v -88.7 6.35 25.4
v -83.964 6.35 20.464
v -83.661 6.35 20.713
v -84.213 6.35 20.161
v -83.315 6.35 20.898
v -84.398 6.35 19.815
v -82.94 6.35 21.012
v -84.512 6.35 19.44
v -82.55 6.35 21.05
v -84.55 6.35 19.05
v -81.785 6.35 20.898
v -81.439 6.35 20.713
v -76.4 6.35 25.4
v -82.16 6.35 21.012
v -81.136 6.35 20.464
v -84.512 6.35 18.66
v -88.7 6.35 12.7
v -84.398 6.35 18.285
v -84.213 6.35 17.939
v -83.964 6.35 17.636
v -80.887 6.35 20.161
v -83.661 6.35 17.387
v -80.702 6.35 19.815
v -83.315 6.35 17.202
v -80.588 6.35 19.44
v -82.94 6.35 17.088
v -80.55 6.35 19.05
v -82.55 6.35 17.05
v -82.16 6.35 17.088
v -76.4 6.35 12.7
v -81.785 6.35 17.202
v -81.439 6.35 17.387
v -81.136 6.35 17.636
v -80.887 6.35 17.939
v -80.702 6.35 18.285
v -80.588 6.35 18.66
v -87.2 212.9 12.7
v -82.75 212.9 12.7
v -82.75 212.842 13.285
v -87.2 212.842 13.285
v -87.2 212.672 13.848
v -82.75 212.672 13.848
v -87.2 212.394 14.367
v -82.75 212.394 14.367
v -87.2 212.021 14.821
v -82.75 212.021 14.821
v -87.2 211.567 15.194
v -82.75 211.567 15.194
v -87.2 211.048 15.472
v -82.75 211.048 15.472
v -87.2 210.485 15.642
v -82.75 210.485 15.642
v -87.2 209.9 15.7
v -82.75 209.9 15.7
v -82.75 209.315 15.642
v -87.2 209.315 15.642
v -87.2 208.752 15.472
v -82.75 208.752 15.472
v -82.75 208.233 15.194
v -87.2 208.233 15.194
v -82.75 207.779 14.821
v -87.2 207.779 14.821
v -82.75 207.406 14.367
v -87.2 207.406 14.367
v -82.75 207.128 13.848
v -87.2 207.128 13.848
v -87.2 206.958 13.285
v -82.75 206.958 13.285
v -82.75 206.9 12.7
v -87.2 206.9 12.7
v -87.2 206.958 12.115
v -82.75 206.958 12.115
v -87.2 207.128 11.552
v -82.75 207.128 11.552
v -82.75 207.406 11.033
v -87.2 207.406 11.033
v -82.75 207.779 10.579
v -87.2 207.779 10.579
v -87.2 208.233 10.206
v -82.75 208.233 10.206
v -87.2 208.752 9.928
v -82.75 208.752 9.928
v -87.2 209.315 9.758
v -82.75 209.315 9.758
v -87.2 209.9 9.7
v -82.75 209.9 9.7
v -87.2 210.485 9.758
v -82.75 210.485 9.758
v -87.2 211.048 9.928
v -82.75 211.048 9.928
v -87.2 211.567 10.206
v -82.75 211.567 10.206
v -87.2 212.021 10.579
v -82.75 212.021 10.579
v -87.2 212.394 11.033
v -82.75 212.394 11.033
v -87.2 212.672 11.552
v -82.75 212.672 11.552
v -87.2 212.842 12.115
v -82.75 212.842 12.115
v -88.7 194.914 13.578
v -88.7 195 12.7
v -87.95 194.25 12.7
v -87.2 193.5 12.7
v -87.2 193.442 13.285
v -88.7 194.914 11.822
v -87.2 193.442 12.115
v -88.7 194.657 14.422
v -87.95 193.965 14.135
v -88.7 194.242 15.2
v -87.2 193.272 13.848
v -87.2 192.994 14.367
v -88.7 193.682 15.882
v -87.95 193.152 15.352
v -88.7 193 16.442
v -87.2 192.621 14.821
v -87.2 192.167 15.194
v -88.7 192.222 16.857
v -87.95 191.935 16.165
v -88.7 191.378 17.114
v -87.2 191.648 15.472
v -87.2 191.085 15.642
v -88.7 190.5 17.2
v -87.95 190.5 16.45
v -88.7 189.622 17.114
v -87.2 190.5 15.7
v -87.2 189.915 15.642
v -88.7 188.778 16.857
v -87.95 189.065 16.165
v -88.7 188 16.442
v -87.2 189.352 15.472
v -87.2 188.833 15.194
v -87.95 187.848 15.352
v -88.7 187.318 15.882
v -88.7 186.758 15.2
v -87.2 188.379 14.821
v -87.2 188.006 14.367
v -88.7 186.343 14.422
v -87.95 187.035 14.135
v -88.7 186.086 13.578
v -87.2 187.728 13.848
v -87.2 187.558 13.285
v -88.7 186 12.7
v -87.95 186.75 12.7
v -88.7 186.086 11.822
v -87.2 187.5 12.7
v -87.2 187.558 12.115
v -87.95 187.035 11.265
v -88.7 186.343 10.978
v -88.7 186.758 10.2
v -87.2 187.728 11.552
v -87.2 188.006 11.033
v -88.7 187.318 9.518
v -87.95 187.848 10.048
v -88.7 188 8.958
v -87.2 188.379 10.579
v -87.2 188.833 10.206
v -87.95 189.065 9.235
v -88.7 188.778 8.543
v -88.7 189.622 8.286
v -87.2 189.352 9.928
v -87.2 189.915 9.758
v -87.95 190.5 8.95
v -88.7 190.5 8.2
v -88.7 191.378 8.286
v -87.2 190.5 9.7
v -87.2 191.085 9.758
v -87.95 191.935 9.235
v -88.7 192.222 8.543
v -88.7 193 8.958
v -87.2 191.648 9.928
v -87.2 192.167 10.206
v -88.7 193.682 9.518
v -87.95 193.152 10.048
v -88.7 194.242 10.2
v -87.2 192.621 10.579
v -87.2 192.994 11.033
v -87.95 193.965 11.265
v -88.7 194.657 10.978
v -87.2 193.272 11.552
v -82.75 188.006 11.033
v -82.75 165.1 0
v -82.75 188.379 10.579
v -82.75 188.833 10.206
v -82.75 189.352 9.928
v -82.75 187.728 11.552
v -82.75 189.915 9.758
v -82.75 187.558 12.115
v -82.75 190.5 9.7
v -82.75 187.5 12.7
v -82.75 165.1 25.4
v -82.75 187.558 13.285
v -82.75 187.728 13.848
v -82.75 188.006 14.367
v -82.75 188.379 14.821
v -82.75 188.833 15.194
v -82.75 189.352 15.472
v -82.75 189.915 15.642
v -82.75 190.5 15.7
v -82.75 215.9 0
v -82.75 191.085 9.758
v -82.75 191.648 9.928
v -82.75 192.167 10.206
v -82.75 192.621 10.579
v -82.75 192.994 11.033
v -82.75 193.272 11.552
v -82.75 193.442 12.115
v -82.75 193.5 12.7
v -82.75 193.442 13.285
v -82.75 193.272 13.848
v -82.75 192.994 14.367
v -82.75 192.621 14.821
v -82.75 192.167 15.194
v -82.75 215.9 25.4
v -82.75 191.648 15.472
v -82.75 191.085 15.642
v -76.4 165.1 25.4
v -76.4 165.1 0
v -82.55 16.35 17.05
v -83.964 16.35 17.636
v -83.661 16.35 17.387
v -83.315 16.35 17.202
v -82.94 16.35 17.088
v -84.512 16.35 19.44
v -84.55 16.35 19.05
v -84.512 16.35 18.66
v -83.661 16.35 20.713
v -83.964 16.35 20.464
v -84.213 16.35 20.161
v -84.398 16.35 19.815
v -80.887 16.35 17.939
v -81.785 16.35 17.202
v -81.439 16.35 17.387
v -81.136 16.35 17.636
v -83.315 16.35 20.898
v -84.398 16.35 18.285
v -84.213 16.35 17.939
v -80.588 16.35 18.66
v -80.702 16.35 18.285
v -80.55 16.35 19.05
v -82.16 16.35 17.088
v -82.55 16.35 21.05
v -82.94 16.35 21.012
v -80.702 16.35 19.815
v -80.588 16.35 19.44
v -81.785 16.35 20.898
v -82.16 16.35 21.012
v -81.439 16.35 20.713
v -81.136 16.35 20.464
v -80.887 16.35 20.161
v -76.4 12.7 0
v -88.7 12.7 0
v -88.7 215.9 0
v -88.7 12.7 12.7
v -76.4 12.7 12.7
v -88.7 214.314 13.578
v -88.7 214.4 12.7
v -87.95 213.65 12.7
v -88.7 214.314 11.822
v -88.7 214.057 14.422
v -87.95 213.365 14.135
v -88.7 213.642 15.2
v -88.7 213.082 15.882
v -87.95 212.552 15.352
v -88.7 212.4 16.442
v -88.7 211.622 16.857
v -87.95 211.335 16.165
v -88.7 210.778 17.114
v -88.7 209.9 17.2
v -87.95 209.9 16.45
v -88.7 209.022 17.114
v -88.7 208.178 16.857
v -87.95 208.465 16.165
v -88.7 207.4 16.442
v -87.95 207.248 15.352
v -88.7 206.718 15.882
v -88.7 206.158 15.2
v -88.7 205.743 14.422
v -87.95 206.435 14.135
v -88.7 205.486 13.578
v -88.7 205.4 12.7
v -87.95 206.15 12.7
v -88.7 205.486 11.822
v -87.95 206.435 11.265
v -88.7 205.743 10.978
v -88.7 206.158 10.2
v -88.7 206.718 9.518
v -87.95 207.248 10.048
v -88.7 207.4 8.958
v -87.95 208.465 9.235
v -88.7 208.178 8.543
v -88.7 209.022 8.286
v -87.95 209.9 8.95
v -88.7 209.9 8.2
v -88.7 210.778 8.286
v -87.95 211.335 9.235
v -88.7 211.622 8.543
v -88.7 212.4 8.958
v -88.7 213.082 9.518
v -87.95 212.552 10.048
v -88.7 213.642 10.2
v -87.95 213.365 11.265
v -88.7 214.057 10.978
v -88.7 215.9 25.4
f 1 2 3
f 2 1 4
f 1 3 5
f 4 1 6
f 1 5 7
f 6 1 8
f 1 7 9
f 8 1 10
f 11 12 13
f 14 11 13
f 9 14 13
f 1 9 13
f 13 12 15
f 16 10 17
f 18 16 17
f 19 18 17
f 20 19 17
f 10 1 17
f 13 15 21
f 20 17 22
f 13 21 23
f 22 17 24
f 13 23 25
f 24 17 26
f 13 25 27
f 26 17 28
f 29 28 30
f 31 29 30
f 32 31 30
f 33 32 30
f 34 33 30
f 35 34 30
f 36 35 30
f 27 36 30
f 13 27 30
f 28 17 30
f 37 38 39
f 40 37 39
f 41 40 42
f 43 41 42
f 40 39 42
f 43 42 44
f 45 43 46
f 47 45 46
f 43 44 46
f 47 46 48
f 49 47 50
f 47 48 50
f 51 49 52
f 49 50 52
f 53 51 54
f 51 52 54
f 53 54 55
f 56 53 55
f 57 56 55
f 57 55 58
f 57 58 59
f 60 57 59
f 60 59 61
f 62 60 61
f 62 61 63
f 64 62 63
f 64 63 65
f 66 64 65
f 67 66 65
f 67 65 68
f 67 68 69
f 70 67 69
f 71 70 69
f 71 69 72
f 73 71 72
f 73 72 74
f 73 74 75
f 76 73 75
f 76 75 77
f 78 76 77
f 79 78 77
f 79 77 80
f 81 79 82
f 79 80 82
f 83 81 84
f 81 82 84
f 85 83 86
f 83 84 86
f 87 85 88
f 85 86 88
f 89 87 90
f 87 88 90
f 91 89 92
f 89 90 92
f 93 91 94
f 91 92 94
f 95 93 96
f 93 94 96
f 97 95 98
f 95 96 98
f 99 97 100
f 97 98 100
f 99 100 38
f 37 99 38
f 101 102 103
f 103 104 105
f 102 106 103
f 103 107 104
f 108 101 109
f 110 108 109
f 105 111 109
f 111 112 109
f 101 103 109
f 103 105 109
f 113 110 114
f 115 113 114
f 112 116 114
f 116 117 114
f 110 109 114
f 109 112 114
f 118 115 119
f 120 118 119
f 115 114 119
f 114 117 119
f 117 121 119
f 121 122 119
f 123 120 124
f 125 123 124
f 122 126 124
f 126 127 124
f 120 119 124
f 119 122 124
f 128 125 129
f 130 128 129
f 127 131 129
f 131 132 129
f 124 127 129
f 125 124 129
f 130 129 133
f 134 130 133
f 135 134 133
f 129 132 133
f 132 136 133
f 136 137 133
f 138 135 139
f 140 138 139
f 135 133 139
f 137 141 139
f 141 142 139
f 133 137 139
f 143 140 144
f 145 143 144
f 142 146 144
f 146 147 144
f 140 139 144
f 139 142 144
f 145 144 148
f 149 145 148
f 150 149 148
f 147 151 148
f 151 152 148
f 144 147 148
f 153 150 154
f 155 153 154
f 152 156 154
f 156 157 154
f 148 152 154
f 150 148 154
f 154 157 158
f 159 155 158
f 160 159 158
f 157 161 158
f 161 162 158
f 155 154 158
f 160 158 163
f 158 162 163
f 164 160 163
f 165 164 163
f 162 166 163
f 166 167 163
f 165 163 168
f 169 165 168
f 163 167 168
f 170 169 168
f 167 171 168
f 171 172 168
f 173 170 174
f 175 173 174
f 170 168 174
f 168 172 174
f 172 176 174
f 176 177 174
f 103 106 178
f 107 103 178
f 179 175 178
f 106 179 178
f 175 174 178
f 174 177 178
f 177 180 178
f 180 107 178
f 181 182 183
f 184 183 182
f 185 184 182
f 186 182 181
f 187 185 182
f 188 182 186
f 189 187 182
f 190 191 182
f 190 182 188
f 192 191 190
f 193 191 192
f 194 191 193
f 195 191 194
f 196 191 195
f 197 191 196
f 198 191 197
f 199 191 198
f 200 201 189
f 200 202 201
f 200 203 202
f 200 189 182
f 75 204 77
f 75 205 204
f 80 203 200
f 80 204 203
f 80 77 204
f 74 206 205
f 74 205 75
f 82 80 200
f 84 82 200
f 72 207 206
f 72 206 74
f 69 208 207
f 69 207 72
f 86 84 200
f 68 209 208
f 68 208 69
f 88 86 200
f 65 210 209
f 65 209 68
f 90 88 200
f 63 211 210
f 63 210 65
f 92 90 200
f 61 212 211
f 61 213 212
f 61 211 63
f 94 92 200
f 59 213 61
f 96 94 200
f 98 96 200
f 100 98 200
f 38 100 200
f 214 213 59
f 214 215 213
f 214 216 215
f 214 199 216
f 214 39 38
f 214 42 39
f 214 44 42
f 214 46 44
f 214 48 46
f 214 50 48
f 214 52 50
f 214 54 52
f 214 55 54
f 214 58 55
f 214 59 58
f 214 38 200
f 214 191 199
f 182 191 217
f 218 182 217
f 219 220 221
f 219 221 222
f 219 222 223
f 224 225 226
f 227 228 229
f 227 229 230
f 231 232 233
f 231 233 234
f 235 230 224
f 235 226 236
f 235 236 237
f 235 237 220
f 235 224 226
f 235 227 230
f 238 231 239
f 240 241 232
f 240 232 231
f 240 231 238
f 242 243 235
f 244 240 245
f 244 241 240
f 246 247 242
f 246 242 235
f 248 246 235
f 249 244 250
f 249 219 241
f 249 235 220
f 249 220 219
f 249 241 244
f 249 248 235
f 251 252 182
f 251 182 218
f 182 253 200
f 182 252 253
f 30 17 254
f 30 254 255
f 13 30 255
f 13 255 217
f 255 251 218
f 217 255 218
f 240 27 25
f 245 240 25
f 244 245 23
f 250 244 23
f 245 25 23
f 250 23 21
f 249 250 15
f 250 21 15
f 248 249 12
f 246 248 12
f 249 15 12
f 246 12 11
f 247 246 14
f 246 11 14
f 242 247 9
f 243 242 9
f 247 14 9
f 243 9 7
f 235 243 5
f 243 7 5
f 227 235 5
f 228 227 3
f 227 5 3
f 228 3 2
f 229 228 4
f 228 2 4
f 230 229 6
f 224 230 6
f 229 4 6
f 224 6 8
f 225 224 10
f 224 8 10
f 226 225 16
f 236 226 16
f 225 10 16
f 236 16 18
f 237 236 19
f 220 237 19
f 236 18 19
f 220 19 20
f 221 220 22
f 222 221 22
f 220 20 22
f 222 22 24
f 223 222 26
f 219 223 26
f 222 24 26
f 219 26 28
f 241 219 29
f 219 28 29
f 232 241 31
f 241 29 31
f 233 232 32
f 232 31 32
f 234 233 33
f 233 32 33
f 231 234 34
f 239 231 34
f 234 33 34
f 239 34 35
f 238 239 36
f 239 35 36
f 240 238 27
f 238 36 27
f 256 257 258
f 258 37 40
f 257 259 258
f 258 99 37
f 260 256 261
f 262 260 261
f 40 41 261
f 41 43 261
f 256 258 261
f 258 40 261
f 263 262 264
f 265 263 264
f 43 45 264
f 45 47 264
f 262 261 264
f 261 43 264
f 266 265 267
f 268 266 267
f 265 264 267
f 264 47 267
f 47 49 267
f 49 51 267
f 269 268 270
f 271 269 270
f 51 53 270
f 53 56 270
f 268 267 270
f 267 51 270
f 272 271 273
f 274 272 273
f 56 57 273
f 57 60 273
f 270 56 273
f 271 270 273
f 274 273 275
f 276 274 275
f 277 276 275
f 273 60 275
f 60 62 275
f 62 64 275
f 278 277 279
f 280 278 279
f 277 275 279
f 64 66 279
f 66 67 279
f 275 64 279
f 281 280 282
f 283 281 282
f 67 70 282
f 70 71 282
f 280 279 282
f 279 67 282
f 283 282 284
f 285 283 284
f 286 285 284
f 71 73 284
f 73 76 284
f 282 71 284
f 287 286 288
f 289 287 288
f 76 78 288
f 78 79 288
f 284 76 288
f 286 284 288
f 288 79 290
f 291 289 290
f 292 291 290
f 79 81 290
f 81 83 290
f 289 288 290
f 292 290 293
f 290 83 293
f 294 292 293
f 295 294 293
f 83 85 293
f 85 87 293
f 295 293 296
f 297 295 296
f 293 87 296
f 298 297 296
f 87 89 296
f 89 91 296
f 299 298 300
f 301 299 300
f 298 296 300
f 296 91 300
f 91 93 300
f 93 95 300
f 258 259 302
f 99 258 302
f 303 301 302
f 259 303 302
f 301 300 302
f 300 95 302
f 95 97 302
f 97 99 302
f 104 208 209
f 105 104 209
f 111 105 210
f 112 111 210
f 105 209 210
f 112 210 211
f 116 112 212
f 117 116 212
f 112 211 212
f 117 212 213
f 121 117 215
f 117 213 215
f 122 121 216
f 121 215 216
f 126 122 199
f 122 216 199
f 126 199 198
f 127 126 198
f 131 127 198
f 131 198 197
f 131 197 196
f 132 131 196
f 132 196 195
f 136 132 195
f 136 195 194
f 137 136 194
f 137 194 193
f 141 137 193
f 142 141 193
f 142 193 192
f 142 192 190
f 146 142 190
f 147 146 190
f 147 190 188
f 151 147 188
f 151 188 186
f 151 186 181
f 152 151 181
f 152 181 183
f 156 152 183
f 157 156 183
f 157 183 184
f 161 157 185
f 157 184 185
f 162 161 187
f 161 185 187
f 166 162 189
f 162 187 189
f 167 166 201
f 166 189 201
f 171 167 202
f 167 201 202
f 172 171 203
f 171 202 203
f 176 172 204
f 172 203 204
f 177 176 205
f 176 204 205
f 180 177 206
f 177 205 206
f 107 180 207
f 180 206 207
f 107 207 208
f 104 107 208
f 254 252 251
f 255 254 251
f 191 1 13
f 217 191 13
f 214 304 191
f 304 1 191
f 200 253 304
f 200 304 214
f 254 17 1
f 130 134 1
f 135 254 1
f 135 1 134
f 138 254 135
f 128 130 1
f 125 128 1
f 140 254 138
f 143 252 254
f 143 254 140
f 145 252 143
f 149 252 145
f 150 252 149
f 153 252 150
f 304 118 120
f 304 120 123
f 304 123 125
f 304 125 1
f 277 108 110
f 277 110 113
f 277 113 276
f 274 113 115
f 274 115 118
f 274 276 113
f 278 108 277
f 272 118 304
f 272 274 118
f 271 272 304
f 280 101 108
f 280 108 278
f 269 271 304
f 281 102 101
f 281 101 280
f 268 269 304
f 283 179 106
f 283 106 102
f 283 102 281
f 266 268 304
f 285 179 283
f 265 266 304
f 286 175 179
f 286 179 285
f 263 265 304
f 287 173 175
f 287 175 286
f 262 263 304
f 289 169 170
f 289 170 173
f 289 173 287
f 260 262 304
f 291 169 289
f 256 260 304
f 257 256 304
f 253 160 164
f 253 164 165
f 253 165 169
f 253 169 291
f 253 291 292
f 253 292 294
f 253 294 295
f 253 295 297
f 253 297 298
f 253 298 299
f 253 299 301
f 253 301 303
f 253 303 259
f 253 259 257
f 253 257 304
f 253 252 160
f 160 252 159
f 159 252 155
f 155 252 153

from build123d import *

# Parameters (mm, degrees)
SKETCH014_W     = 12.3
SKETCH014_H     = 209.55
PAD003_DEPTH    = 25.4
SKETCH015_W     = 12.3
SKETCH015_H     = 6.35
POCKET011_DEPTH = 12.7
SKETCH016_R     = 2
POCKET012_DEPTH = 10
SKETCH017_W     = 6.35
SKETCH017_H     = 50.8
POCKET013_DEPTH = 25.401
SKETCH018_R     = 3
POCKET014_DEPTH = 5.951
CHAMFER003_SIZE = 1.5


with BuildPart() as part:
    # Sketch014 → Pad003 (new body)
    with BuildSketch(Plane.XY):
        with Locations((-82.55, 111.125)):
            Rectangle(SKETCH014_W, SKETCH014_H)
    extrude(amount=PAD003_DEPTH)

    # Sketch015 (on Face5 of Pad003) → Pocket011 (cut)
    with BuildSketch(Plane(origin=(0, 0, 0), x_dir=(1, 0, 0), z_dir=(0, 0, -1))):
        with Locations((-82.55, -9.525)):
            Rectangle(SKETCH015_W, SKETCH015_H)
    extrude(amount=-POCKET011_DEPTH, mode=Mode.SUBTRACT)

    # Sketch016 (on Face1 of Pocket011) → Pocket012 (cut)
    with BuildSketch(Plane.XZ.offset(-6.35)):
        with Locations((-82.55, 19.05)):
            Circle(SKETCH016_R)
    extrude(amount=-POCKET012_DEPTH, mode=Mode.SUBTRACT)

    # Sketch017 (on Face5 of Pocket012) → Pocket013 (cut, through all)
    with BuildSketch(Plane.XY.offset(25.4)):
        with Locations((-79.575, 190.5)):
            Rectangle(SKETCH017_W, SKETCH017_H)
    extrude(amount=-POCKET013_DEPTH, mode=Mode.SUBTRACT)

    # Sketch018 (on Face11 of Pocket013) → Pocket014 (cut, through all)
    with BuildSketch(Plane.YZ.offset(-82.75)):
        with Locations((190.5, 12.7)):
            Circle(SKETCH018_R)
        with Locations((209.9, 12.7)):
            Circle(SKETCH018_R)
    extrude(amount=-POCKET014_DEPTH, mode=Mode.SUBTRACT)

    # Chamfer003
    chamfer003_edges = [part.edges().sort_by_distance(p)[0] for p in [
        (-88.7, 187.5, 12.7),
        (-88.7, 206.9, 12.7),
    ]]
    chamfer(chamfer003_edges, length=CHAMFER003_SIZE)


solid = part.part
